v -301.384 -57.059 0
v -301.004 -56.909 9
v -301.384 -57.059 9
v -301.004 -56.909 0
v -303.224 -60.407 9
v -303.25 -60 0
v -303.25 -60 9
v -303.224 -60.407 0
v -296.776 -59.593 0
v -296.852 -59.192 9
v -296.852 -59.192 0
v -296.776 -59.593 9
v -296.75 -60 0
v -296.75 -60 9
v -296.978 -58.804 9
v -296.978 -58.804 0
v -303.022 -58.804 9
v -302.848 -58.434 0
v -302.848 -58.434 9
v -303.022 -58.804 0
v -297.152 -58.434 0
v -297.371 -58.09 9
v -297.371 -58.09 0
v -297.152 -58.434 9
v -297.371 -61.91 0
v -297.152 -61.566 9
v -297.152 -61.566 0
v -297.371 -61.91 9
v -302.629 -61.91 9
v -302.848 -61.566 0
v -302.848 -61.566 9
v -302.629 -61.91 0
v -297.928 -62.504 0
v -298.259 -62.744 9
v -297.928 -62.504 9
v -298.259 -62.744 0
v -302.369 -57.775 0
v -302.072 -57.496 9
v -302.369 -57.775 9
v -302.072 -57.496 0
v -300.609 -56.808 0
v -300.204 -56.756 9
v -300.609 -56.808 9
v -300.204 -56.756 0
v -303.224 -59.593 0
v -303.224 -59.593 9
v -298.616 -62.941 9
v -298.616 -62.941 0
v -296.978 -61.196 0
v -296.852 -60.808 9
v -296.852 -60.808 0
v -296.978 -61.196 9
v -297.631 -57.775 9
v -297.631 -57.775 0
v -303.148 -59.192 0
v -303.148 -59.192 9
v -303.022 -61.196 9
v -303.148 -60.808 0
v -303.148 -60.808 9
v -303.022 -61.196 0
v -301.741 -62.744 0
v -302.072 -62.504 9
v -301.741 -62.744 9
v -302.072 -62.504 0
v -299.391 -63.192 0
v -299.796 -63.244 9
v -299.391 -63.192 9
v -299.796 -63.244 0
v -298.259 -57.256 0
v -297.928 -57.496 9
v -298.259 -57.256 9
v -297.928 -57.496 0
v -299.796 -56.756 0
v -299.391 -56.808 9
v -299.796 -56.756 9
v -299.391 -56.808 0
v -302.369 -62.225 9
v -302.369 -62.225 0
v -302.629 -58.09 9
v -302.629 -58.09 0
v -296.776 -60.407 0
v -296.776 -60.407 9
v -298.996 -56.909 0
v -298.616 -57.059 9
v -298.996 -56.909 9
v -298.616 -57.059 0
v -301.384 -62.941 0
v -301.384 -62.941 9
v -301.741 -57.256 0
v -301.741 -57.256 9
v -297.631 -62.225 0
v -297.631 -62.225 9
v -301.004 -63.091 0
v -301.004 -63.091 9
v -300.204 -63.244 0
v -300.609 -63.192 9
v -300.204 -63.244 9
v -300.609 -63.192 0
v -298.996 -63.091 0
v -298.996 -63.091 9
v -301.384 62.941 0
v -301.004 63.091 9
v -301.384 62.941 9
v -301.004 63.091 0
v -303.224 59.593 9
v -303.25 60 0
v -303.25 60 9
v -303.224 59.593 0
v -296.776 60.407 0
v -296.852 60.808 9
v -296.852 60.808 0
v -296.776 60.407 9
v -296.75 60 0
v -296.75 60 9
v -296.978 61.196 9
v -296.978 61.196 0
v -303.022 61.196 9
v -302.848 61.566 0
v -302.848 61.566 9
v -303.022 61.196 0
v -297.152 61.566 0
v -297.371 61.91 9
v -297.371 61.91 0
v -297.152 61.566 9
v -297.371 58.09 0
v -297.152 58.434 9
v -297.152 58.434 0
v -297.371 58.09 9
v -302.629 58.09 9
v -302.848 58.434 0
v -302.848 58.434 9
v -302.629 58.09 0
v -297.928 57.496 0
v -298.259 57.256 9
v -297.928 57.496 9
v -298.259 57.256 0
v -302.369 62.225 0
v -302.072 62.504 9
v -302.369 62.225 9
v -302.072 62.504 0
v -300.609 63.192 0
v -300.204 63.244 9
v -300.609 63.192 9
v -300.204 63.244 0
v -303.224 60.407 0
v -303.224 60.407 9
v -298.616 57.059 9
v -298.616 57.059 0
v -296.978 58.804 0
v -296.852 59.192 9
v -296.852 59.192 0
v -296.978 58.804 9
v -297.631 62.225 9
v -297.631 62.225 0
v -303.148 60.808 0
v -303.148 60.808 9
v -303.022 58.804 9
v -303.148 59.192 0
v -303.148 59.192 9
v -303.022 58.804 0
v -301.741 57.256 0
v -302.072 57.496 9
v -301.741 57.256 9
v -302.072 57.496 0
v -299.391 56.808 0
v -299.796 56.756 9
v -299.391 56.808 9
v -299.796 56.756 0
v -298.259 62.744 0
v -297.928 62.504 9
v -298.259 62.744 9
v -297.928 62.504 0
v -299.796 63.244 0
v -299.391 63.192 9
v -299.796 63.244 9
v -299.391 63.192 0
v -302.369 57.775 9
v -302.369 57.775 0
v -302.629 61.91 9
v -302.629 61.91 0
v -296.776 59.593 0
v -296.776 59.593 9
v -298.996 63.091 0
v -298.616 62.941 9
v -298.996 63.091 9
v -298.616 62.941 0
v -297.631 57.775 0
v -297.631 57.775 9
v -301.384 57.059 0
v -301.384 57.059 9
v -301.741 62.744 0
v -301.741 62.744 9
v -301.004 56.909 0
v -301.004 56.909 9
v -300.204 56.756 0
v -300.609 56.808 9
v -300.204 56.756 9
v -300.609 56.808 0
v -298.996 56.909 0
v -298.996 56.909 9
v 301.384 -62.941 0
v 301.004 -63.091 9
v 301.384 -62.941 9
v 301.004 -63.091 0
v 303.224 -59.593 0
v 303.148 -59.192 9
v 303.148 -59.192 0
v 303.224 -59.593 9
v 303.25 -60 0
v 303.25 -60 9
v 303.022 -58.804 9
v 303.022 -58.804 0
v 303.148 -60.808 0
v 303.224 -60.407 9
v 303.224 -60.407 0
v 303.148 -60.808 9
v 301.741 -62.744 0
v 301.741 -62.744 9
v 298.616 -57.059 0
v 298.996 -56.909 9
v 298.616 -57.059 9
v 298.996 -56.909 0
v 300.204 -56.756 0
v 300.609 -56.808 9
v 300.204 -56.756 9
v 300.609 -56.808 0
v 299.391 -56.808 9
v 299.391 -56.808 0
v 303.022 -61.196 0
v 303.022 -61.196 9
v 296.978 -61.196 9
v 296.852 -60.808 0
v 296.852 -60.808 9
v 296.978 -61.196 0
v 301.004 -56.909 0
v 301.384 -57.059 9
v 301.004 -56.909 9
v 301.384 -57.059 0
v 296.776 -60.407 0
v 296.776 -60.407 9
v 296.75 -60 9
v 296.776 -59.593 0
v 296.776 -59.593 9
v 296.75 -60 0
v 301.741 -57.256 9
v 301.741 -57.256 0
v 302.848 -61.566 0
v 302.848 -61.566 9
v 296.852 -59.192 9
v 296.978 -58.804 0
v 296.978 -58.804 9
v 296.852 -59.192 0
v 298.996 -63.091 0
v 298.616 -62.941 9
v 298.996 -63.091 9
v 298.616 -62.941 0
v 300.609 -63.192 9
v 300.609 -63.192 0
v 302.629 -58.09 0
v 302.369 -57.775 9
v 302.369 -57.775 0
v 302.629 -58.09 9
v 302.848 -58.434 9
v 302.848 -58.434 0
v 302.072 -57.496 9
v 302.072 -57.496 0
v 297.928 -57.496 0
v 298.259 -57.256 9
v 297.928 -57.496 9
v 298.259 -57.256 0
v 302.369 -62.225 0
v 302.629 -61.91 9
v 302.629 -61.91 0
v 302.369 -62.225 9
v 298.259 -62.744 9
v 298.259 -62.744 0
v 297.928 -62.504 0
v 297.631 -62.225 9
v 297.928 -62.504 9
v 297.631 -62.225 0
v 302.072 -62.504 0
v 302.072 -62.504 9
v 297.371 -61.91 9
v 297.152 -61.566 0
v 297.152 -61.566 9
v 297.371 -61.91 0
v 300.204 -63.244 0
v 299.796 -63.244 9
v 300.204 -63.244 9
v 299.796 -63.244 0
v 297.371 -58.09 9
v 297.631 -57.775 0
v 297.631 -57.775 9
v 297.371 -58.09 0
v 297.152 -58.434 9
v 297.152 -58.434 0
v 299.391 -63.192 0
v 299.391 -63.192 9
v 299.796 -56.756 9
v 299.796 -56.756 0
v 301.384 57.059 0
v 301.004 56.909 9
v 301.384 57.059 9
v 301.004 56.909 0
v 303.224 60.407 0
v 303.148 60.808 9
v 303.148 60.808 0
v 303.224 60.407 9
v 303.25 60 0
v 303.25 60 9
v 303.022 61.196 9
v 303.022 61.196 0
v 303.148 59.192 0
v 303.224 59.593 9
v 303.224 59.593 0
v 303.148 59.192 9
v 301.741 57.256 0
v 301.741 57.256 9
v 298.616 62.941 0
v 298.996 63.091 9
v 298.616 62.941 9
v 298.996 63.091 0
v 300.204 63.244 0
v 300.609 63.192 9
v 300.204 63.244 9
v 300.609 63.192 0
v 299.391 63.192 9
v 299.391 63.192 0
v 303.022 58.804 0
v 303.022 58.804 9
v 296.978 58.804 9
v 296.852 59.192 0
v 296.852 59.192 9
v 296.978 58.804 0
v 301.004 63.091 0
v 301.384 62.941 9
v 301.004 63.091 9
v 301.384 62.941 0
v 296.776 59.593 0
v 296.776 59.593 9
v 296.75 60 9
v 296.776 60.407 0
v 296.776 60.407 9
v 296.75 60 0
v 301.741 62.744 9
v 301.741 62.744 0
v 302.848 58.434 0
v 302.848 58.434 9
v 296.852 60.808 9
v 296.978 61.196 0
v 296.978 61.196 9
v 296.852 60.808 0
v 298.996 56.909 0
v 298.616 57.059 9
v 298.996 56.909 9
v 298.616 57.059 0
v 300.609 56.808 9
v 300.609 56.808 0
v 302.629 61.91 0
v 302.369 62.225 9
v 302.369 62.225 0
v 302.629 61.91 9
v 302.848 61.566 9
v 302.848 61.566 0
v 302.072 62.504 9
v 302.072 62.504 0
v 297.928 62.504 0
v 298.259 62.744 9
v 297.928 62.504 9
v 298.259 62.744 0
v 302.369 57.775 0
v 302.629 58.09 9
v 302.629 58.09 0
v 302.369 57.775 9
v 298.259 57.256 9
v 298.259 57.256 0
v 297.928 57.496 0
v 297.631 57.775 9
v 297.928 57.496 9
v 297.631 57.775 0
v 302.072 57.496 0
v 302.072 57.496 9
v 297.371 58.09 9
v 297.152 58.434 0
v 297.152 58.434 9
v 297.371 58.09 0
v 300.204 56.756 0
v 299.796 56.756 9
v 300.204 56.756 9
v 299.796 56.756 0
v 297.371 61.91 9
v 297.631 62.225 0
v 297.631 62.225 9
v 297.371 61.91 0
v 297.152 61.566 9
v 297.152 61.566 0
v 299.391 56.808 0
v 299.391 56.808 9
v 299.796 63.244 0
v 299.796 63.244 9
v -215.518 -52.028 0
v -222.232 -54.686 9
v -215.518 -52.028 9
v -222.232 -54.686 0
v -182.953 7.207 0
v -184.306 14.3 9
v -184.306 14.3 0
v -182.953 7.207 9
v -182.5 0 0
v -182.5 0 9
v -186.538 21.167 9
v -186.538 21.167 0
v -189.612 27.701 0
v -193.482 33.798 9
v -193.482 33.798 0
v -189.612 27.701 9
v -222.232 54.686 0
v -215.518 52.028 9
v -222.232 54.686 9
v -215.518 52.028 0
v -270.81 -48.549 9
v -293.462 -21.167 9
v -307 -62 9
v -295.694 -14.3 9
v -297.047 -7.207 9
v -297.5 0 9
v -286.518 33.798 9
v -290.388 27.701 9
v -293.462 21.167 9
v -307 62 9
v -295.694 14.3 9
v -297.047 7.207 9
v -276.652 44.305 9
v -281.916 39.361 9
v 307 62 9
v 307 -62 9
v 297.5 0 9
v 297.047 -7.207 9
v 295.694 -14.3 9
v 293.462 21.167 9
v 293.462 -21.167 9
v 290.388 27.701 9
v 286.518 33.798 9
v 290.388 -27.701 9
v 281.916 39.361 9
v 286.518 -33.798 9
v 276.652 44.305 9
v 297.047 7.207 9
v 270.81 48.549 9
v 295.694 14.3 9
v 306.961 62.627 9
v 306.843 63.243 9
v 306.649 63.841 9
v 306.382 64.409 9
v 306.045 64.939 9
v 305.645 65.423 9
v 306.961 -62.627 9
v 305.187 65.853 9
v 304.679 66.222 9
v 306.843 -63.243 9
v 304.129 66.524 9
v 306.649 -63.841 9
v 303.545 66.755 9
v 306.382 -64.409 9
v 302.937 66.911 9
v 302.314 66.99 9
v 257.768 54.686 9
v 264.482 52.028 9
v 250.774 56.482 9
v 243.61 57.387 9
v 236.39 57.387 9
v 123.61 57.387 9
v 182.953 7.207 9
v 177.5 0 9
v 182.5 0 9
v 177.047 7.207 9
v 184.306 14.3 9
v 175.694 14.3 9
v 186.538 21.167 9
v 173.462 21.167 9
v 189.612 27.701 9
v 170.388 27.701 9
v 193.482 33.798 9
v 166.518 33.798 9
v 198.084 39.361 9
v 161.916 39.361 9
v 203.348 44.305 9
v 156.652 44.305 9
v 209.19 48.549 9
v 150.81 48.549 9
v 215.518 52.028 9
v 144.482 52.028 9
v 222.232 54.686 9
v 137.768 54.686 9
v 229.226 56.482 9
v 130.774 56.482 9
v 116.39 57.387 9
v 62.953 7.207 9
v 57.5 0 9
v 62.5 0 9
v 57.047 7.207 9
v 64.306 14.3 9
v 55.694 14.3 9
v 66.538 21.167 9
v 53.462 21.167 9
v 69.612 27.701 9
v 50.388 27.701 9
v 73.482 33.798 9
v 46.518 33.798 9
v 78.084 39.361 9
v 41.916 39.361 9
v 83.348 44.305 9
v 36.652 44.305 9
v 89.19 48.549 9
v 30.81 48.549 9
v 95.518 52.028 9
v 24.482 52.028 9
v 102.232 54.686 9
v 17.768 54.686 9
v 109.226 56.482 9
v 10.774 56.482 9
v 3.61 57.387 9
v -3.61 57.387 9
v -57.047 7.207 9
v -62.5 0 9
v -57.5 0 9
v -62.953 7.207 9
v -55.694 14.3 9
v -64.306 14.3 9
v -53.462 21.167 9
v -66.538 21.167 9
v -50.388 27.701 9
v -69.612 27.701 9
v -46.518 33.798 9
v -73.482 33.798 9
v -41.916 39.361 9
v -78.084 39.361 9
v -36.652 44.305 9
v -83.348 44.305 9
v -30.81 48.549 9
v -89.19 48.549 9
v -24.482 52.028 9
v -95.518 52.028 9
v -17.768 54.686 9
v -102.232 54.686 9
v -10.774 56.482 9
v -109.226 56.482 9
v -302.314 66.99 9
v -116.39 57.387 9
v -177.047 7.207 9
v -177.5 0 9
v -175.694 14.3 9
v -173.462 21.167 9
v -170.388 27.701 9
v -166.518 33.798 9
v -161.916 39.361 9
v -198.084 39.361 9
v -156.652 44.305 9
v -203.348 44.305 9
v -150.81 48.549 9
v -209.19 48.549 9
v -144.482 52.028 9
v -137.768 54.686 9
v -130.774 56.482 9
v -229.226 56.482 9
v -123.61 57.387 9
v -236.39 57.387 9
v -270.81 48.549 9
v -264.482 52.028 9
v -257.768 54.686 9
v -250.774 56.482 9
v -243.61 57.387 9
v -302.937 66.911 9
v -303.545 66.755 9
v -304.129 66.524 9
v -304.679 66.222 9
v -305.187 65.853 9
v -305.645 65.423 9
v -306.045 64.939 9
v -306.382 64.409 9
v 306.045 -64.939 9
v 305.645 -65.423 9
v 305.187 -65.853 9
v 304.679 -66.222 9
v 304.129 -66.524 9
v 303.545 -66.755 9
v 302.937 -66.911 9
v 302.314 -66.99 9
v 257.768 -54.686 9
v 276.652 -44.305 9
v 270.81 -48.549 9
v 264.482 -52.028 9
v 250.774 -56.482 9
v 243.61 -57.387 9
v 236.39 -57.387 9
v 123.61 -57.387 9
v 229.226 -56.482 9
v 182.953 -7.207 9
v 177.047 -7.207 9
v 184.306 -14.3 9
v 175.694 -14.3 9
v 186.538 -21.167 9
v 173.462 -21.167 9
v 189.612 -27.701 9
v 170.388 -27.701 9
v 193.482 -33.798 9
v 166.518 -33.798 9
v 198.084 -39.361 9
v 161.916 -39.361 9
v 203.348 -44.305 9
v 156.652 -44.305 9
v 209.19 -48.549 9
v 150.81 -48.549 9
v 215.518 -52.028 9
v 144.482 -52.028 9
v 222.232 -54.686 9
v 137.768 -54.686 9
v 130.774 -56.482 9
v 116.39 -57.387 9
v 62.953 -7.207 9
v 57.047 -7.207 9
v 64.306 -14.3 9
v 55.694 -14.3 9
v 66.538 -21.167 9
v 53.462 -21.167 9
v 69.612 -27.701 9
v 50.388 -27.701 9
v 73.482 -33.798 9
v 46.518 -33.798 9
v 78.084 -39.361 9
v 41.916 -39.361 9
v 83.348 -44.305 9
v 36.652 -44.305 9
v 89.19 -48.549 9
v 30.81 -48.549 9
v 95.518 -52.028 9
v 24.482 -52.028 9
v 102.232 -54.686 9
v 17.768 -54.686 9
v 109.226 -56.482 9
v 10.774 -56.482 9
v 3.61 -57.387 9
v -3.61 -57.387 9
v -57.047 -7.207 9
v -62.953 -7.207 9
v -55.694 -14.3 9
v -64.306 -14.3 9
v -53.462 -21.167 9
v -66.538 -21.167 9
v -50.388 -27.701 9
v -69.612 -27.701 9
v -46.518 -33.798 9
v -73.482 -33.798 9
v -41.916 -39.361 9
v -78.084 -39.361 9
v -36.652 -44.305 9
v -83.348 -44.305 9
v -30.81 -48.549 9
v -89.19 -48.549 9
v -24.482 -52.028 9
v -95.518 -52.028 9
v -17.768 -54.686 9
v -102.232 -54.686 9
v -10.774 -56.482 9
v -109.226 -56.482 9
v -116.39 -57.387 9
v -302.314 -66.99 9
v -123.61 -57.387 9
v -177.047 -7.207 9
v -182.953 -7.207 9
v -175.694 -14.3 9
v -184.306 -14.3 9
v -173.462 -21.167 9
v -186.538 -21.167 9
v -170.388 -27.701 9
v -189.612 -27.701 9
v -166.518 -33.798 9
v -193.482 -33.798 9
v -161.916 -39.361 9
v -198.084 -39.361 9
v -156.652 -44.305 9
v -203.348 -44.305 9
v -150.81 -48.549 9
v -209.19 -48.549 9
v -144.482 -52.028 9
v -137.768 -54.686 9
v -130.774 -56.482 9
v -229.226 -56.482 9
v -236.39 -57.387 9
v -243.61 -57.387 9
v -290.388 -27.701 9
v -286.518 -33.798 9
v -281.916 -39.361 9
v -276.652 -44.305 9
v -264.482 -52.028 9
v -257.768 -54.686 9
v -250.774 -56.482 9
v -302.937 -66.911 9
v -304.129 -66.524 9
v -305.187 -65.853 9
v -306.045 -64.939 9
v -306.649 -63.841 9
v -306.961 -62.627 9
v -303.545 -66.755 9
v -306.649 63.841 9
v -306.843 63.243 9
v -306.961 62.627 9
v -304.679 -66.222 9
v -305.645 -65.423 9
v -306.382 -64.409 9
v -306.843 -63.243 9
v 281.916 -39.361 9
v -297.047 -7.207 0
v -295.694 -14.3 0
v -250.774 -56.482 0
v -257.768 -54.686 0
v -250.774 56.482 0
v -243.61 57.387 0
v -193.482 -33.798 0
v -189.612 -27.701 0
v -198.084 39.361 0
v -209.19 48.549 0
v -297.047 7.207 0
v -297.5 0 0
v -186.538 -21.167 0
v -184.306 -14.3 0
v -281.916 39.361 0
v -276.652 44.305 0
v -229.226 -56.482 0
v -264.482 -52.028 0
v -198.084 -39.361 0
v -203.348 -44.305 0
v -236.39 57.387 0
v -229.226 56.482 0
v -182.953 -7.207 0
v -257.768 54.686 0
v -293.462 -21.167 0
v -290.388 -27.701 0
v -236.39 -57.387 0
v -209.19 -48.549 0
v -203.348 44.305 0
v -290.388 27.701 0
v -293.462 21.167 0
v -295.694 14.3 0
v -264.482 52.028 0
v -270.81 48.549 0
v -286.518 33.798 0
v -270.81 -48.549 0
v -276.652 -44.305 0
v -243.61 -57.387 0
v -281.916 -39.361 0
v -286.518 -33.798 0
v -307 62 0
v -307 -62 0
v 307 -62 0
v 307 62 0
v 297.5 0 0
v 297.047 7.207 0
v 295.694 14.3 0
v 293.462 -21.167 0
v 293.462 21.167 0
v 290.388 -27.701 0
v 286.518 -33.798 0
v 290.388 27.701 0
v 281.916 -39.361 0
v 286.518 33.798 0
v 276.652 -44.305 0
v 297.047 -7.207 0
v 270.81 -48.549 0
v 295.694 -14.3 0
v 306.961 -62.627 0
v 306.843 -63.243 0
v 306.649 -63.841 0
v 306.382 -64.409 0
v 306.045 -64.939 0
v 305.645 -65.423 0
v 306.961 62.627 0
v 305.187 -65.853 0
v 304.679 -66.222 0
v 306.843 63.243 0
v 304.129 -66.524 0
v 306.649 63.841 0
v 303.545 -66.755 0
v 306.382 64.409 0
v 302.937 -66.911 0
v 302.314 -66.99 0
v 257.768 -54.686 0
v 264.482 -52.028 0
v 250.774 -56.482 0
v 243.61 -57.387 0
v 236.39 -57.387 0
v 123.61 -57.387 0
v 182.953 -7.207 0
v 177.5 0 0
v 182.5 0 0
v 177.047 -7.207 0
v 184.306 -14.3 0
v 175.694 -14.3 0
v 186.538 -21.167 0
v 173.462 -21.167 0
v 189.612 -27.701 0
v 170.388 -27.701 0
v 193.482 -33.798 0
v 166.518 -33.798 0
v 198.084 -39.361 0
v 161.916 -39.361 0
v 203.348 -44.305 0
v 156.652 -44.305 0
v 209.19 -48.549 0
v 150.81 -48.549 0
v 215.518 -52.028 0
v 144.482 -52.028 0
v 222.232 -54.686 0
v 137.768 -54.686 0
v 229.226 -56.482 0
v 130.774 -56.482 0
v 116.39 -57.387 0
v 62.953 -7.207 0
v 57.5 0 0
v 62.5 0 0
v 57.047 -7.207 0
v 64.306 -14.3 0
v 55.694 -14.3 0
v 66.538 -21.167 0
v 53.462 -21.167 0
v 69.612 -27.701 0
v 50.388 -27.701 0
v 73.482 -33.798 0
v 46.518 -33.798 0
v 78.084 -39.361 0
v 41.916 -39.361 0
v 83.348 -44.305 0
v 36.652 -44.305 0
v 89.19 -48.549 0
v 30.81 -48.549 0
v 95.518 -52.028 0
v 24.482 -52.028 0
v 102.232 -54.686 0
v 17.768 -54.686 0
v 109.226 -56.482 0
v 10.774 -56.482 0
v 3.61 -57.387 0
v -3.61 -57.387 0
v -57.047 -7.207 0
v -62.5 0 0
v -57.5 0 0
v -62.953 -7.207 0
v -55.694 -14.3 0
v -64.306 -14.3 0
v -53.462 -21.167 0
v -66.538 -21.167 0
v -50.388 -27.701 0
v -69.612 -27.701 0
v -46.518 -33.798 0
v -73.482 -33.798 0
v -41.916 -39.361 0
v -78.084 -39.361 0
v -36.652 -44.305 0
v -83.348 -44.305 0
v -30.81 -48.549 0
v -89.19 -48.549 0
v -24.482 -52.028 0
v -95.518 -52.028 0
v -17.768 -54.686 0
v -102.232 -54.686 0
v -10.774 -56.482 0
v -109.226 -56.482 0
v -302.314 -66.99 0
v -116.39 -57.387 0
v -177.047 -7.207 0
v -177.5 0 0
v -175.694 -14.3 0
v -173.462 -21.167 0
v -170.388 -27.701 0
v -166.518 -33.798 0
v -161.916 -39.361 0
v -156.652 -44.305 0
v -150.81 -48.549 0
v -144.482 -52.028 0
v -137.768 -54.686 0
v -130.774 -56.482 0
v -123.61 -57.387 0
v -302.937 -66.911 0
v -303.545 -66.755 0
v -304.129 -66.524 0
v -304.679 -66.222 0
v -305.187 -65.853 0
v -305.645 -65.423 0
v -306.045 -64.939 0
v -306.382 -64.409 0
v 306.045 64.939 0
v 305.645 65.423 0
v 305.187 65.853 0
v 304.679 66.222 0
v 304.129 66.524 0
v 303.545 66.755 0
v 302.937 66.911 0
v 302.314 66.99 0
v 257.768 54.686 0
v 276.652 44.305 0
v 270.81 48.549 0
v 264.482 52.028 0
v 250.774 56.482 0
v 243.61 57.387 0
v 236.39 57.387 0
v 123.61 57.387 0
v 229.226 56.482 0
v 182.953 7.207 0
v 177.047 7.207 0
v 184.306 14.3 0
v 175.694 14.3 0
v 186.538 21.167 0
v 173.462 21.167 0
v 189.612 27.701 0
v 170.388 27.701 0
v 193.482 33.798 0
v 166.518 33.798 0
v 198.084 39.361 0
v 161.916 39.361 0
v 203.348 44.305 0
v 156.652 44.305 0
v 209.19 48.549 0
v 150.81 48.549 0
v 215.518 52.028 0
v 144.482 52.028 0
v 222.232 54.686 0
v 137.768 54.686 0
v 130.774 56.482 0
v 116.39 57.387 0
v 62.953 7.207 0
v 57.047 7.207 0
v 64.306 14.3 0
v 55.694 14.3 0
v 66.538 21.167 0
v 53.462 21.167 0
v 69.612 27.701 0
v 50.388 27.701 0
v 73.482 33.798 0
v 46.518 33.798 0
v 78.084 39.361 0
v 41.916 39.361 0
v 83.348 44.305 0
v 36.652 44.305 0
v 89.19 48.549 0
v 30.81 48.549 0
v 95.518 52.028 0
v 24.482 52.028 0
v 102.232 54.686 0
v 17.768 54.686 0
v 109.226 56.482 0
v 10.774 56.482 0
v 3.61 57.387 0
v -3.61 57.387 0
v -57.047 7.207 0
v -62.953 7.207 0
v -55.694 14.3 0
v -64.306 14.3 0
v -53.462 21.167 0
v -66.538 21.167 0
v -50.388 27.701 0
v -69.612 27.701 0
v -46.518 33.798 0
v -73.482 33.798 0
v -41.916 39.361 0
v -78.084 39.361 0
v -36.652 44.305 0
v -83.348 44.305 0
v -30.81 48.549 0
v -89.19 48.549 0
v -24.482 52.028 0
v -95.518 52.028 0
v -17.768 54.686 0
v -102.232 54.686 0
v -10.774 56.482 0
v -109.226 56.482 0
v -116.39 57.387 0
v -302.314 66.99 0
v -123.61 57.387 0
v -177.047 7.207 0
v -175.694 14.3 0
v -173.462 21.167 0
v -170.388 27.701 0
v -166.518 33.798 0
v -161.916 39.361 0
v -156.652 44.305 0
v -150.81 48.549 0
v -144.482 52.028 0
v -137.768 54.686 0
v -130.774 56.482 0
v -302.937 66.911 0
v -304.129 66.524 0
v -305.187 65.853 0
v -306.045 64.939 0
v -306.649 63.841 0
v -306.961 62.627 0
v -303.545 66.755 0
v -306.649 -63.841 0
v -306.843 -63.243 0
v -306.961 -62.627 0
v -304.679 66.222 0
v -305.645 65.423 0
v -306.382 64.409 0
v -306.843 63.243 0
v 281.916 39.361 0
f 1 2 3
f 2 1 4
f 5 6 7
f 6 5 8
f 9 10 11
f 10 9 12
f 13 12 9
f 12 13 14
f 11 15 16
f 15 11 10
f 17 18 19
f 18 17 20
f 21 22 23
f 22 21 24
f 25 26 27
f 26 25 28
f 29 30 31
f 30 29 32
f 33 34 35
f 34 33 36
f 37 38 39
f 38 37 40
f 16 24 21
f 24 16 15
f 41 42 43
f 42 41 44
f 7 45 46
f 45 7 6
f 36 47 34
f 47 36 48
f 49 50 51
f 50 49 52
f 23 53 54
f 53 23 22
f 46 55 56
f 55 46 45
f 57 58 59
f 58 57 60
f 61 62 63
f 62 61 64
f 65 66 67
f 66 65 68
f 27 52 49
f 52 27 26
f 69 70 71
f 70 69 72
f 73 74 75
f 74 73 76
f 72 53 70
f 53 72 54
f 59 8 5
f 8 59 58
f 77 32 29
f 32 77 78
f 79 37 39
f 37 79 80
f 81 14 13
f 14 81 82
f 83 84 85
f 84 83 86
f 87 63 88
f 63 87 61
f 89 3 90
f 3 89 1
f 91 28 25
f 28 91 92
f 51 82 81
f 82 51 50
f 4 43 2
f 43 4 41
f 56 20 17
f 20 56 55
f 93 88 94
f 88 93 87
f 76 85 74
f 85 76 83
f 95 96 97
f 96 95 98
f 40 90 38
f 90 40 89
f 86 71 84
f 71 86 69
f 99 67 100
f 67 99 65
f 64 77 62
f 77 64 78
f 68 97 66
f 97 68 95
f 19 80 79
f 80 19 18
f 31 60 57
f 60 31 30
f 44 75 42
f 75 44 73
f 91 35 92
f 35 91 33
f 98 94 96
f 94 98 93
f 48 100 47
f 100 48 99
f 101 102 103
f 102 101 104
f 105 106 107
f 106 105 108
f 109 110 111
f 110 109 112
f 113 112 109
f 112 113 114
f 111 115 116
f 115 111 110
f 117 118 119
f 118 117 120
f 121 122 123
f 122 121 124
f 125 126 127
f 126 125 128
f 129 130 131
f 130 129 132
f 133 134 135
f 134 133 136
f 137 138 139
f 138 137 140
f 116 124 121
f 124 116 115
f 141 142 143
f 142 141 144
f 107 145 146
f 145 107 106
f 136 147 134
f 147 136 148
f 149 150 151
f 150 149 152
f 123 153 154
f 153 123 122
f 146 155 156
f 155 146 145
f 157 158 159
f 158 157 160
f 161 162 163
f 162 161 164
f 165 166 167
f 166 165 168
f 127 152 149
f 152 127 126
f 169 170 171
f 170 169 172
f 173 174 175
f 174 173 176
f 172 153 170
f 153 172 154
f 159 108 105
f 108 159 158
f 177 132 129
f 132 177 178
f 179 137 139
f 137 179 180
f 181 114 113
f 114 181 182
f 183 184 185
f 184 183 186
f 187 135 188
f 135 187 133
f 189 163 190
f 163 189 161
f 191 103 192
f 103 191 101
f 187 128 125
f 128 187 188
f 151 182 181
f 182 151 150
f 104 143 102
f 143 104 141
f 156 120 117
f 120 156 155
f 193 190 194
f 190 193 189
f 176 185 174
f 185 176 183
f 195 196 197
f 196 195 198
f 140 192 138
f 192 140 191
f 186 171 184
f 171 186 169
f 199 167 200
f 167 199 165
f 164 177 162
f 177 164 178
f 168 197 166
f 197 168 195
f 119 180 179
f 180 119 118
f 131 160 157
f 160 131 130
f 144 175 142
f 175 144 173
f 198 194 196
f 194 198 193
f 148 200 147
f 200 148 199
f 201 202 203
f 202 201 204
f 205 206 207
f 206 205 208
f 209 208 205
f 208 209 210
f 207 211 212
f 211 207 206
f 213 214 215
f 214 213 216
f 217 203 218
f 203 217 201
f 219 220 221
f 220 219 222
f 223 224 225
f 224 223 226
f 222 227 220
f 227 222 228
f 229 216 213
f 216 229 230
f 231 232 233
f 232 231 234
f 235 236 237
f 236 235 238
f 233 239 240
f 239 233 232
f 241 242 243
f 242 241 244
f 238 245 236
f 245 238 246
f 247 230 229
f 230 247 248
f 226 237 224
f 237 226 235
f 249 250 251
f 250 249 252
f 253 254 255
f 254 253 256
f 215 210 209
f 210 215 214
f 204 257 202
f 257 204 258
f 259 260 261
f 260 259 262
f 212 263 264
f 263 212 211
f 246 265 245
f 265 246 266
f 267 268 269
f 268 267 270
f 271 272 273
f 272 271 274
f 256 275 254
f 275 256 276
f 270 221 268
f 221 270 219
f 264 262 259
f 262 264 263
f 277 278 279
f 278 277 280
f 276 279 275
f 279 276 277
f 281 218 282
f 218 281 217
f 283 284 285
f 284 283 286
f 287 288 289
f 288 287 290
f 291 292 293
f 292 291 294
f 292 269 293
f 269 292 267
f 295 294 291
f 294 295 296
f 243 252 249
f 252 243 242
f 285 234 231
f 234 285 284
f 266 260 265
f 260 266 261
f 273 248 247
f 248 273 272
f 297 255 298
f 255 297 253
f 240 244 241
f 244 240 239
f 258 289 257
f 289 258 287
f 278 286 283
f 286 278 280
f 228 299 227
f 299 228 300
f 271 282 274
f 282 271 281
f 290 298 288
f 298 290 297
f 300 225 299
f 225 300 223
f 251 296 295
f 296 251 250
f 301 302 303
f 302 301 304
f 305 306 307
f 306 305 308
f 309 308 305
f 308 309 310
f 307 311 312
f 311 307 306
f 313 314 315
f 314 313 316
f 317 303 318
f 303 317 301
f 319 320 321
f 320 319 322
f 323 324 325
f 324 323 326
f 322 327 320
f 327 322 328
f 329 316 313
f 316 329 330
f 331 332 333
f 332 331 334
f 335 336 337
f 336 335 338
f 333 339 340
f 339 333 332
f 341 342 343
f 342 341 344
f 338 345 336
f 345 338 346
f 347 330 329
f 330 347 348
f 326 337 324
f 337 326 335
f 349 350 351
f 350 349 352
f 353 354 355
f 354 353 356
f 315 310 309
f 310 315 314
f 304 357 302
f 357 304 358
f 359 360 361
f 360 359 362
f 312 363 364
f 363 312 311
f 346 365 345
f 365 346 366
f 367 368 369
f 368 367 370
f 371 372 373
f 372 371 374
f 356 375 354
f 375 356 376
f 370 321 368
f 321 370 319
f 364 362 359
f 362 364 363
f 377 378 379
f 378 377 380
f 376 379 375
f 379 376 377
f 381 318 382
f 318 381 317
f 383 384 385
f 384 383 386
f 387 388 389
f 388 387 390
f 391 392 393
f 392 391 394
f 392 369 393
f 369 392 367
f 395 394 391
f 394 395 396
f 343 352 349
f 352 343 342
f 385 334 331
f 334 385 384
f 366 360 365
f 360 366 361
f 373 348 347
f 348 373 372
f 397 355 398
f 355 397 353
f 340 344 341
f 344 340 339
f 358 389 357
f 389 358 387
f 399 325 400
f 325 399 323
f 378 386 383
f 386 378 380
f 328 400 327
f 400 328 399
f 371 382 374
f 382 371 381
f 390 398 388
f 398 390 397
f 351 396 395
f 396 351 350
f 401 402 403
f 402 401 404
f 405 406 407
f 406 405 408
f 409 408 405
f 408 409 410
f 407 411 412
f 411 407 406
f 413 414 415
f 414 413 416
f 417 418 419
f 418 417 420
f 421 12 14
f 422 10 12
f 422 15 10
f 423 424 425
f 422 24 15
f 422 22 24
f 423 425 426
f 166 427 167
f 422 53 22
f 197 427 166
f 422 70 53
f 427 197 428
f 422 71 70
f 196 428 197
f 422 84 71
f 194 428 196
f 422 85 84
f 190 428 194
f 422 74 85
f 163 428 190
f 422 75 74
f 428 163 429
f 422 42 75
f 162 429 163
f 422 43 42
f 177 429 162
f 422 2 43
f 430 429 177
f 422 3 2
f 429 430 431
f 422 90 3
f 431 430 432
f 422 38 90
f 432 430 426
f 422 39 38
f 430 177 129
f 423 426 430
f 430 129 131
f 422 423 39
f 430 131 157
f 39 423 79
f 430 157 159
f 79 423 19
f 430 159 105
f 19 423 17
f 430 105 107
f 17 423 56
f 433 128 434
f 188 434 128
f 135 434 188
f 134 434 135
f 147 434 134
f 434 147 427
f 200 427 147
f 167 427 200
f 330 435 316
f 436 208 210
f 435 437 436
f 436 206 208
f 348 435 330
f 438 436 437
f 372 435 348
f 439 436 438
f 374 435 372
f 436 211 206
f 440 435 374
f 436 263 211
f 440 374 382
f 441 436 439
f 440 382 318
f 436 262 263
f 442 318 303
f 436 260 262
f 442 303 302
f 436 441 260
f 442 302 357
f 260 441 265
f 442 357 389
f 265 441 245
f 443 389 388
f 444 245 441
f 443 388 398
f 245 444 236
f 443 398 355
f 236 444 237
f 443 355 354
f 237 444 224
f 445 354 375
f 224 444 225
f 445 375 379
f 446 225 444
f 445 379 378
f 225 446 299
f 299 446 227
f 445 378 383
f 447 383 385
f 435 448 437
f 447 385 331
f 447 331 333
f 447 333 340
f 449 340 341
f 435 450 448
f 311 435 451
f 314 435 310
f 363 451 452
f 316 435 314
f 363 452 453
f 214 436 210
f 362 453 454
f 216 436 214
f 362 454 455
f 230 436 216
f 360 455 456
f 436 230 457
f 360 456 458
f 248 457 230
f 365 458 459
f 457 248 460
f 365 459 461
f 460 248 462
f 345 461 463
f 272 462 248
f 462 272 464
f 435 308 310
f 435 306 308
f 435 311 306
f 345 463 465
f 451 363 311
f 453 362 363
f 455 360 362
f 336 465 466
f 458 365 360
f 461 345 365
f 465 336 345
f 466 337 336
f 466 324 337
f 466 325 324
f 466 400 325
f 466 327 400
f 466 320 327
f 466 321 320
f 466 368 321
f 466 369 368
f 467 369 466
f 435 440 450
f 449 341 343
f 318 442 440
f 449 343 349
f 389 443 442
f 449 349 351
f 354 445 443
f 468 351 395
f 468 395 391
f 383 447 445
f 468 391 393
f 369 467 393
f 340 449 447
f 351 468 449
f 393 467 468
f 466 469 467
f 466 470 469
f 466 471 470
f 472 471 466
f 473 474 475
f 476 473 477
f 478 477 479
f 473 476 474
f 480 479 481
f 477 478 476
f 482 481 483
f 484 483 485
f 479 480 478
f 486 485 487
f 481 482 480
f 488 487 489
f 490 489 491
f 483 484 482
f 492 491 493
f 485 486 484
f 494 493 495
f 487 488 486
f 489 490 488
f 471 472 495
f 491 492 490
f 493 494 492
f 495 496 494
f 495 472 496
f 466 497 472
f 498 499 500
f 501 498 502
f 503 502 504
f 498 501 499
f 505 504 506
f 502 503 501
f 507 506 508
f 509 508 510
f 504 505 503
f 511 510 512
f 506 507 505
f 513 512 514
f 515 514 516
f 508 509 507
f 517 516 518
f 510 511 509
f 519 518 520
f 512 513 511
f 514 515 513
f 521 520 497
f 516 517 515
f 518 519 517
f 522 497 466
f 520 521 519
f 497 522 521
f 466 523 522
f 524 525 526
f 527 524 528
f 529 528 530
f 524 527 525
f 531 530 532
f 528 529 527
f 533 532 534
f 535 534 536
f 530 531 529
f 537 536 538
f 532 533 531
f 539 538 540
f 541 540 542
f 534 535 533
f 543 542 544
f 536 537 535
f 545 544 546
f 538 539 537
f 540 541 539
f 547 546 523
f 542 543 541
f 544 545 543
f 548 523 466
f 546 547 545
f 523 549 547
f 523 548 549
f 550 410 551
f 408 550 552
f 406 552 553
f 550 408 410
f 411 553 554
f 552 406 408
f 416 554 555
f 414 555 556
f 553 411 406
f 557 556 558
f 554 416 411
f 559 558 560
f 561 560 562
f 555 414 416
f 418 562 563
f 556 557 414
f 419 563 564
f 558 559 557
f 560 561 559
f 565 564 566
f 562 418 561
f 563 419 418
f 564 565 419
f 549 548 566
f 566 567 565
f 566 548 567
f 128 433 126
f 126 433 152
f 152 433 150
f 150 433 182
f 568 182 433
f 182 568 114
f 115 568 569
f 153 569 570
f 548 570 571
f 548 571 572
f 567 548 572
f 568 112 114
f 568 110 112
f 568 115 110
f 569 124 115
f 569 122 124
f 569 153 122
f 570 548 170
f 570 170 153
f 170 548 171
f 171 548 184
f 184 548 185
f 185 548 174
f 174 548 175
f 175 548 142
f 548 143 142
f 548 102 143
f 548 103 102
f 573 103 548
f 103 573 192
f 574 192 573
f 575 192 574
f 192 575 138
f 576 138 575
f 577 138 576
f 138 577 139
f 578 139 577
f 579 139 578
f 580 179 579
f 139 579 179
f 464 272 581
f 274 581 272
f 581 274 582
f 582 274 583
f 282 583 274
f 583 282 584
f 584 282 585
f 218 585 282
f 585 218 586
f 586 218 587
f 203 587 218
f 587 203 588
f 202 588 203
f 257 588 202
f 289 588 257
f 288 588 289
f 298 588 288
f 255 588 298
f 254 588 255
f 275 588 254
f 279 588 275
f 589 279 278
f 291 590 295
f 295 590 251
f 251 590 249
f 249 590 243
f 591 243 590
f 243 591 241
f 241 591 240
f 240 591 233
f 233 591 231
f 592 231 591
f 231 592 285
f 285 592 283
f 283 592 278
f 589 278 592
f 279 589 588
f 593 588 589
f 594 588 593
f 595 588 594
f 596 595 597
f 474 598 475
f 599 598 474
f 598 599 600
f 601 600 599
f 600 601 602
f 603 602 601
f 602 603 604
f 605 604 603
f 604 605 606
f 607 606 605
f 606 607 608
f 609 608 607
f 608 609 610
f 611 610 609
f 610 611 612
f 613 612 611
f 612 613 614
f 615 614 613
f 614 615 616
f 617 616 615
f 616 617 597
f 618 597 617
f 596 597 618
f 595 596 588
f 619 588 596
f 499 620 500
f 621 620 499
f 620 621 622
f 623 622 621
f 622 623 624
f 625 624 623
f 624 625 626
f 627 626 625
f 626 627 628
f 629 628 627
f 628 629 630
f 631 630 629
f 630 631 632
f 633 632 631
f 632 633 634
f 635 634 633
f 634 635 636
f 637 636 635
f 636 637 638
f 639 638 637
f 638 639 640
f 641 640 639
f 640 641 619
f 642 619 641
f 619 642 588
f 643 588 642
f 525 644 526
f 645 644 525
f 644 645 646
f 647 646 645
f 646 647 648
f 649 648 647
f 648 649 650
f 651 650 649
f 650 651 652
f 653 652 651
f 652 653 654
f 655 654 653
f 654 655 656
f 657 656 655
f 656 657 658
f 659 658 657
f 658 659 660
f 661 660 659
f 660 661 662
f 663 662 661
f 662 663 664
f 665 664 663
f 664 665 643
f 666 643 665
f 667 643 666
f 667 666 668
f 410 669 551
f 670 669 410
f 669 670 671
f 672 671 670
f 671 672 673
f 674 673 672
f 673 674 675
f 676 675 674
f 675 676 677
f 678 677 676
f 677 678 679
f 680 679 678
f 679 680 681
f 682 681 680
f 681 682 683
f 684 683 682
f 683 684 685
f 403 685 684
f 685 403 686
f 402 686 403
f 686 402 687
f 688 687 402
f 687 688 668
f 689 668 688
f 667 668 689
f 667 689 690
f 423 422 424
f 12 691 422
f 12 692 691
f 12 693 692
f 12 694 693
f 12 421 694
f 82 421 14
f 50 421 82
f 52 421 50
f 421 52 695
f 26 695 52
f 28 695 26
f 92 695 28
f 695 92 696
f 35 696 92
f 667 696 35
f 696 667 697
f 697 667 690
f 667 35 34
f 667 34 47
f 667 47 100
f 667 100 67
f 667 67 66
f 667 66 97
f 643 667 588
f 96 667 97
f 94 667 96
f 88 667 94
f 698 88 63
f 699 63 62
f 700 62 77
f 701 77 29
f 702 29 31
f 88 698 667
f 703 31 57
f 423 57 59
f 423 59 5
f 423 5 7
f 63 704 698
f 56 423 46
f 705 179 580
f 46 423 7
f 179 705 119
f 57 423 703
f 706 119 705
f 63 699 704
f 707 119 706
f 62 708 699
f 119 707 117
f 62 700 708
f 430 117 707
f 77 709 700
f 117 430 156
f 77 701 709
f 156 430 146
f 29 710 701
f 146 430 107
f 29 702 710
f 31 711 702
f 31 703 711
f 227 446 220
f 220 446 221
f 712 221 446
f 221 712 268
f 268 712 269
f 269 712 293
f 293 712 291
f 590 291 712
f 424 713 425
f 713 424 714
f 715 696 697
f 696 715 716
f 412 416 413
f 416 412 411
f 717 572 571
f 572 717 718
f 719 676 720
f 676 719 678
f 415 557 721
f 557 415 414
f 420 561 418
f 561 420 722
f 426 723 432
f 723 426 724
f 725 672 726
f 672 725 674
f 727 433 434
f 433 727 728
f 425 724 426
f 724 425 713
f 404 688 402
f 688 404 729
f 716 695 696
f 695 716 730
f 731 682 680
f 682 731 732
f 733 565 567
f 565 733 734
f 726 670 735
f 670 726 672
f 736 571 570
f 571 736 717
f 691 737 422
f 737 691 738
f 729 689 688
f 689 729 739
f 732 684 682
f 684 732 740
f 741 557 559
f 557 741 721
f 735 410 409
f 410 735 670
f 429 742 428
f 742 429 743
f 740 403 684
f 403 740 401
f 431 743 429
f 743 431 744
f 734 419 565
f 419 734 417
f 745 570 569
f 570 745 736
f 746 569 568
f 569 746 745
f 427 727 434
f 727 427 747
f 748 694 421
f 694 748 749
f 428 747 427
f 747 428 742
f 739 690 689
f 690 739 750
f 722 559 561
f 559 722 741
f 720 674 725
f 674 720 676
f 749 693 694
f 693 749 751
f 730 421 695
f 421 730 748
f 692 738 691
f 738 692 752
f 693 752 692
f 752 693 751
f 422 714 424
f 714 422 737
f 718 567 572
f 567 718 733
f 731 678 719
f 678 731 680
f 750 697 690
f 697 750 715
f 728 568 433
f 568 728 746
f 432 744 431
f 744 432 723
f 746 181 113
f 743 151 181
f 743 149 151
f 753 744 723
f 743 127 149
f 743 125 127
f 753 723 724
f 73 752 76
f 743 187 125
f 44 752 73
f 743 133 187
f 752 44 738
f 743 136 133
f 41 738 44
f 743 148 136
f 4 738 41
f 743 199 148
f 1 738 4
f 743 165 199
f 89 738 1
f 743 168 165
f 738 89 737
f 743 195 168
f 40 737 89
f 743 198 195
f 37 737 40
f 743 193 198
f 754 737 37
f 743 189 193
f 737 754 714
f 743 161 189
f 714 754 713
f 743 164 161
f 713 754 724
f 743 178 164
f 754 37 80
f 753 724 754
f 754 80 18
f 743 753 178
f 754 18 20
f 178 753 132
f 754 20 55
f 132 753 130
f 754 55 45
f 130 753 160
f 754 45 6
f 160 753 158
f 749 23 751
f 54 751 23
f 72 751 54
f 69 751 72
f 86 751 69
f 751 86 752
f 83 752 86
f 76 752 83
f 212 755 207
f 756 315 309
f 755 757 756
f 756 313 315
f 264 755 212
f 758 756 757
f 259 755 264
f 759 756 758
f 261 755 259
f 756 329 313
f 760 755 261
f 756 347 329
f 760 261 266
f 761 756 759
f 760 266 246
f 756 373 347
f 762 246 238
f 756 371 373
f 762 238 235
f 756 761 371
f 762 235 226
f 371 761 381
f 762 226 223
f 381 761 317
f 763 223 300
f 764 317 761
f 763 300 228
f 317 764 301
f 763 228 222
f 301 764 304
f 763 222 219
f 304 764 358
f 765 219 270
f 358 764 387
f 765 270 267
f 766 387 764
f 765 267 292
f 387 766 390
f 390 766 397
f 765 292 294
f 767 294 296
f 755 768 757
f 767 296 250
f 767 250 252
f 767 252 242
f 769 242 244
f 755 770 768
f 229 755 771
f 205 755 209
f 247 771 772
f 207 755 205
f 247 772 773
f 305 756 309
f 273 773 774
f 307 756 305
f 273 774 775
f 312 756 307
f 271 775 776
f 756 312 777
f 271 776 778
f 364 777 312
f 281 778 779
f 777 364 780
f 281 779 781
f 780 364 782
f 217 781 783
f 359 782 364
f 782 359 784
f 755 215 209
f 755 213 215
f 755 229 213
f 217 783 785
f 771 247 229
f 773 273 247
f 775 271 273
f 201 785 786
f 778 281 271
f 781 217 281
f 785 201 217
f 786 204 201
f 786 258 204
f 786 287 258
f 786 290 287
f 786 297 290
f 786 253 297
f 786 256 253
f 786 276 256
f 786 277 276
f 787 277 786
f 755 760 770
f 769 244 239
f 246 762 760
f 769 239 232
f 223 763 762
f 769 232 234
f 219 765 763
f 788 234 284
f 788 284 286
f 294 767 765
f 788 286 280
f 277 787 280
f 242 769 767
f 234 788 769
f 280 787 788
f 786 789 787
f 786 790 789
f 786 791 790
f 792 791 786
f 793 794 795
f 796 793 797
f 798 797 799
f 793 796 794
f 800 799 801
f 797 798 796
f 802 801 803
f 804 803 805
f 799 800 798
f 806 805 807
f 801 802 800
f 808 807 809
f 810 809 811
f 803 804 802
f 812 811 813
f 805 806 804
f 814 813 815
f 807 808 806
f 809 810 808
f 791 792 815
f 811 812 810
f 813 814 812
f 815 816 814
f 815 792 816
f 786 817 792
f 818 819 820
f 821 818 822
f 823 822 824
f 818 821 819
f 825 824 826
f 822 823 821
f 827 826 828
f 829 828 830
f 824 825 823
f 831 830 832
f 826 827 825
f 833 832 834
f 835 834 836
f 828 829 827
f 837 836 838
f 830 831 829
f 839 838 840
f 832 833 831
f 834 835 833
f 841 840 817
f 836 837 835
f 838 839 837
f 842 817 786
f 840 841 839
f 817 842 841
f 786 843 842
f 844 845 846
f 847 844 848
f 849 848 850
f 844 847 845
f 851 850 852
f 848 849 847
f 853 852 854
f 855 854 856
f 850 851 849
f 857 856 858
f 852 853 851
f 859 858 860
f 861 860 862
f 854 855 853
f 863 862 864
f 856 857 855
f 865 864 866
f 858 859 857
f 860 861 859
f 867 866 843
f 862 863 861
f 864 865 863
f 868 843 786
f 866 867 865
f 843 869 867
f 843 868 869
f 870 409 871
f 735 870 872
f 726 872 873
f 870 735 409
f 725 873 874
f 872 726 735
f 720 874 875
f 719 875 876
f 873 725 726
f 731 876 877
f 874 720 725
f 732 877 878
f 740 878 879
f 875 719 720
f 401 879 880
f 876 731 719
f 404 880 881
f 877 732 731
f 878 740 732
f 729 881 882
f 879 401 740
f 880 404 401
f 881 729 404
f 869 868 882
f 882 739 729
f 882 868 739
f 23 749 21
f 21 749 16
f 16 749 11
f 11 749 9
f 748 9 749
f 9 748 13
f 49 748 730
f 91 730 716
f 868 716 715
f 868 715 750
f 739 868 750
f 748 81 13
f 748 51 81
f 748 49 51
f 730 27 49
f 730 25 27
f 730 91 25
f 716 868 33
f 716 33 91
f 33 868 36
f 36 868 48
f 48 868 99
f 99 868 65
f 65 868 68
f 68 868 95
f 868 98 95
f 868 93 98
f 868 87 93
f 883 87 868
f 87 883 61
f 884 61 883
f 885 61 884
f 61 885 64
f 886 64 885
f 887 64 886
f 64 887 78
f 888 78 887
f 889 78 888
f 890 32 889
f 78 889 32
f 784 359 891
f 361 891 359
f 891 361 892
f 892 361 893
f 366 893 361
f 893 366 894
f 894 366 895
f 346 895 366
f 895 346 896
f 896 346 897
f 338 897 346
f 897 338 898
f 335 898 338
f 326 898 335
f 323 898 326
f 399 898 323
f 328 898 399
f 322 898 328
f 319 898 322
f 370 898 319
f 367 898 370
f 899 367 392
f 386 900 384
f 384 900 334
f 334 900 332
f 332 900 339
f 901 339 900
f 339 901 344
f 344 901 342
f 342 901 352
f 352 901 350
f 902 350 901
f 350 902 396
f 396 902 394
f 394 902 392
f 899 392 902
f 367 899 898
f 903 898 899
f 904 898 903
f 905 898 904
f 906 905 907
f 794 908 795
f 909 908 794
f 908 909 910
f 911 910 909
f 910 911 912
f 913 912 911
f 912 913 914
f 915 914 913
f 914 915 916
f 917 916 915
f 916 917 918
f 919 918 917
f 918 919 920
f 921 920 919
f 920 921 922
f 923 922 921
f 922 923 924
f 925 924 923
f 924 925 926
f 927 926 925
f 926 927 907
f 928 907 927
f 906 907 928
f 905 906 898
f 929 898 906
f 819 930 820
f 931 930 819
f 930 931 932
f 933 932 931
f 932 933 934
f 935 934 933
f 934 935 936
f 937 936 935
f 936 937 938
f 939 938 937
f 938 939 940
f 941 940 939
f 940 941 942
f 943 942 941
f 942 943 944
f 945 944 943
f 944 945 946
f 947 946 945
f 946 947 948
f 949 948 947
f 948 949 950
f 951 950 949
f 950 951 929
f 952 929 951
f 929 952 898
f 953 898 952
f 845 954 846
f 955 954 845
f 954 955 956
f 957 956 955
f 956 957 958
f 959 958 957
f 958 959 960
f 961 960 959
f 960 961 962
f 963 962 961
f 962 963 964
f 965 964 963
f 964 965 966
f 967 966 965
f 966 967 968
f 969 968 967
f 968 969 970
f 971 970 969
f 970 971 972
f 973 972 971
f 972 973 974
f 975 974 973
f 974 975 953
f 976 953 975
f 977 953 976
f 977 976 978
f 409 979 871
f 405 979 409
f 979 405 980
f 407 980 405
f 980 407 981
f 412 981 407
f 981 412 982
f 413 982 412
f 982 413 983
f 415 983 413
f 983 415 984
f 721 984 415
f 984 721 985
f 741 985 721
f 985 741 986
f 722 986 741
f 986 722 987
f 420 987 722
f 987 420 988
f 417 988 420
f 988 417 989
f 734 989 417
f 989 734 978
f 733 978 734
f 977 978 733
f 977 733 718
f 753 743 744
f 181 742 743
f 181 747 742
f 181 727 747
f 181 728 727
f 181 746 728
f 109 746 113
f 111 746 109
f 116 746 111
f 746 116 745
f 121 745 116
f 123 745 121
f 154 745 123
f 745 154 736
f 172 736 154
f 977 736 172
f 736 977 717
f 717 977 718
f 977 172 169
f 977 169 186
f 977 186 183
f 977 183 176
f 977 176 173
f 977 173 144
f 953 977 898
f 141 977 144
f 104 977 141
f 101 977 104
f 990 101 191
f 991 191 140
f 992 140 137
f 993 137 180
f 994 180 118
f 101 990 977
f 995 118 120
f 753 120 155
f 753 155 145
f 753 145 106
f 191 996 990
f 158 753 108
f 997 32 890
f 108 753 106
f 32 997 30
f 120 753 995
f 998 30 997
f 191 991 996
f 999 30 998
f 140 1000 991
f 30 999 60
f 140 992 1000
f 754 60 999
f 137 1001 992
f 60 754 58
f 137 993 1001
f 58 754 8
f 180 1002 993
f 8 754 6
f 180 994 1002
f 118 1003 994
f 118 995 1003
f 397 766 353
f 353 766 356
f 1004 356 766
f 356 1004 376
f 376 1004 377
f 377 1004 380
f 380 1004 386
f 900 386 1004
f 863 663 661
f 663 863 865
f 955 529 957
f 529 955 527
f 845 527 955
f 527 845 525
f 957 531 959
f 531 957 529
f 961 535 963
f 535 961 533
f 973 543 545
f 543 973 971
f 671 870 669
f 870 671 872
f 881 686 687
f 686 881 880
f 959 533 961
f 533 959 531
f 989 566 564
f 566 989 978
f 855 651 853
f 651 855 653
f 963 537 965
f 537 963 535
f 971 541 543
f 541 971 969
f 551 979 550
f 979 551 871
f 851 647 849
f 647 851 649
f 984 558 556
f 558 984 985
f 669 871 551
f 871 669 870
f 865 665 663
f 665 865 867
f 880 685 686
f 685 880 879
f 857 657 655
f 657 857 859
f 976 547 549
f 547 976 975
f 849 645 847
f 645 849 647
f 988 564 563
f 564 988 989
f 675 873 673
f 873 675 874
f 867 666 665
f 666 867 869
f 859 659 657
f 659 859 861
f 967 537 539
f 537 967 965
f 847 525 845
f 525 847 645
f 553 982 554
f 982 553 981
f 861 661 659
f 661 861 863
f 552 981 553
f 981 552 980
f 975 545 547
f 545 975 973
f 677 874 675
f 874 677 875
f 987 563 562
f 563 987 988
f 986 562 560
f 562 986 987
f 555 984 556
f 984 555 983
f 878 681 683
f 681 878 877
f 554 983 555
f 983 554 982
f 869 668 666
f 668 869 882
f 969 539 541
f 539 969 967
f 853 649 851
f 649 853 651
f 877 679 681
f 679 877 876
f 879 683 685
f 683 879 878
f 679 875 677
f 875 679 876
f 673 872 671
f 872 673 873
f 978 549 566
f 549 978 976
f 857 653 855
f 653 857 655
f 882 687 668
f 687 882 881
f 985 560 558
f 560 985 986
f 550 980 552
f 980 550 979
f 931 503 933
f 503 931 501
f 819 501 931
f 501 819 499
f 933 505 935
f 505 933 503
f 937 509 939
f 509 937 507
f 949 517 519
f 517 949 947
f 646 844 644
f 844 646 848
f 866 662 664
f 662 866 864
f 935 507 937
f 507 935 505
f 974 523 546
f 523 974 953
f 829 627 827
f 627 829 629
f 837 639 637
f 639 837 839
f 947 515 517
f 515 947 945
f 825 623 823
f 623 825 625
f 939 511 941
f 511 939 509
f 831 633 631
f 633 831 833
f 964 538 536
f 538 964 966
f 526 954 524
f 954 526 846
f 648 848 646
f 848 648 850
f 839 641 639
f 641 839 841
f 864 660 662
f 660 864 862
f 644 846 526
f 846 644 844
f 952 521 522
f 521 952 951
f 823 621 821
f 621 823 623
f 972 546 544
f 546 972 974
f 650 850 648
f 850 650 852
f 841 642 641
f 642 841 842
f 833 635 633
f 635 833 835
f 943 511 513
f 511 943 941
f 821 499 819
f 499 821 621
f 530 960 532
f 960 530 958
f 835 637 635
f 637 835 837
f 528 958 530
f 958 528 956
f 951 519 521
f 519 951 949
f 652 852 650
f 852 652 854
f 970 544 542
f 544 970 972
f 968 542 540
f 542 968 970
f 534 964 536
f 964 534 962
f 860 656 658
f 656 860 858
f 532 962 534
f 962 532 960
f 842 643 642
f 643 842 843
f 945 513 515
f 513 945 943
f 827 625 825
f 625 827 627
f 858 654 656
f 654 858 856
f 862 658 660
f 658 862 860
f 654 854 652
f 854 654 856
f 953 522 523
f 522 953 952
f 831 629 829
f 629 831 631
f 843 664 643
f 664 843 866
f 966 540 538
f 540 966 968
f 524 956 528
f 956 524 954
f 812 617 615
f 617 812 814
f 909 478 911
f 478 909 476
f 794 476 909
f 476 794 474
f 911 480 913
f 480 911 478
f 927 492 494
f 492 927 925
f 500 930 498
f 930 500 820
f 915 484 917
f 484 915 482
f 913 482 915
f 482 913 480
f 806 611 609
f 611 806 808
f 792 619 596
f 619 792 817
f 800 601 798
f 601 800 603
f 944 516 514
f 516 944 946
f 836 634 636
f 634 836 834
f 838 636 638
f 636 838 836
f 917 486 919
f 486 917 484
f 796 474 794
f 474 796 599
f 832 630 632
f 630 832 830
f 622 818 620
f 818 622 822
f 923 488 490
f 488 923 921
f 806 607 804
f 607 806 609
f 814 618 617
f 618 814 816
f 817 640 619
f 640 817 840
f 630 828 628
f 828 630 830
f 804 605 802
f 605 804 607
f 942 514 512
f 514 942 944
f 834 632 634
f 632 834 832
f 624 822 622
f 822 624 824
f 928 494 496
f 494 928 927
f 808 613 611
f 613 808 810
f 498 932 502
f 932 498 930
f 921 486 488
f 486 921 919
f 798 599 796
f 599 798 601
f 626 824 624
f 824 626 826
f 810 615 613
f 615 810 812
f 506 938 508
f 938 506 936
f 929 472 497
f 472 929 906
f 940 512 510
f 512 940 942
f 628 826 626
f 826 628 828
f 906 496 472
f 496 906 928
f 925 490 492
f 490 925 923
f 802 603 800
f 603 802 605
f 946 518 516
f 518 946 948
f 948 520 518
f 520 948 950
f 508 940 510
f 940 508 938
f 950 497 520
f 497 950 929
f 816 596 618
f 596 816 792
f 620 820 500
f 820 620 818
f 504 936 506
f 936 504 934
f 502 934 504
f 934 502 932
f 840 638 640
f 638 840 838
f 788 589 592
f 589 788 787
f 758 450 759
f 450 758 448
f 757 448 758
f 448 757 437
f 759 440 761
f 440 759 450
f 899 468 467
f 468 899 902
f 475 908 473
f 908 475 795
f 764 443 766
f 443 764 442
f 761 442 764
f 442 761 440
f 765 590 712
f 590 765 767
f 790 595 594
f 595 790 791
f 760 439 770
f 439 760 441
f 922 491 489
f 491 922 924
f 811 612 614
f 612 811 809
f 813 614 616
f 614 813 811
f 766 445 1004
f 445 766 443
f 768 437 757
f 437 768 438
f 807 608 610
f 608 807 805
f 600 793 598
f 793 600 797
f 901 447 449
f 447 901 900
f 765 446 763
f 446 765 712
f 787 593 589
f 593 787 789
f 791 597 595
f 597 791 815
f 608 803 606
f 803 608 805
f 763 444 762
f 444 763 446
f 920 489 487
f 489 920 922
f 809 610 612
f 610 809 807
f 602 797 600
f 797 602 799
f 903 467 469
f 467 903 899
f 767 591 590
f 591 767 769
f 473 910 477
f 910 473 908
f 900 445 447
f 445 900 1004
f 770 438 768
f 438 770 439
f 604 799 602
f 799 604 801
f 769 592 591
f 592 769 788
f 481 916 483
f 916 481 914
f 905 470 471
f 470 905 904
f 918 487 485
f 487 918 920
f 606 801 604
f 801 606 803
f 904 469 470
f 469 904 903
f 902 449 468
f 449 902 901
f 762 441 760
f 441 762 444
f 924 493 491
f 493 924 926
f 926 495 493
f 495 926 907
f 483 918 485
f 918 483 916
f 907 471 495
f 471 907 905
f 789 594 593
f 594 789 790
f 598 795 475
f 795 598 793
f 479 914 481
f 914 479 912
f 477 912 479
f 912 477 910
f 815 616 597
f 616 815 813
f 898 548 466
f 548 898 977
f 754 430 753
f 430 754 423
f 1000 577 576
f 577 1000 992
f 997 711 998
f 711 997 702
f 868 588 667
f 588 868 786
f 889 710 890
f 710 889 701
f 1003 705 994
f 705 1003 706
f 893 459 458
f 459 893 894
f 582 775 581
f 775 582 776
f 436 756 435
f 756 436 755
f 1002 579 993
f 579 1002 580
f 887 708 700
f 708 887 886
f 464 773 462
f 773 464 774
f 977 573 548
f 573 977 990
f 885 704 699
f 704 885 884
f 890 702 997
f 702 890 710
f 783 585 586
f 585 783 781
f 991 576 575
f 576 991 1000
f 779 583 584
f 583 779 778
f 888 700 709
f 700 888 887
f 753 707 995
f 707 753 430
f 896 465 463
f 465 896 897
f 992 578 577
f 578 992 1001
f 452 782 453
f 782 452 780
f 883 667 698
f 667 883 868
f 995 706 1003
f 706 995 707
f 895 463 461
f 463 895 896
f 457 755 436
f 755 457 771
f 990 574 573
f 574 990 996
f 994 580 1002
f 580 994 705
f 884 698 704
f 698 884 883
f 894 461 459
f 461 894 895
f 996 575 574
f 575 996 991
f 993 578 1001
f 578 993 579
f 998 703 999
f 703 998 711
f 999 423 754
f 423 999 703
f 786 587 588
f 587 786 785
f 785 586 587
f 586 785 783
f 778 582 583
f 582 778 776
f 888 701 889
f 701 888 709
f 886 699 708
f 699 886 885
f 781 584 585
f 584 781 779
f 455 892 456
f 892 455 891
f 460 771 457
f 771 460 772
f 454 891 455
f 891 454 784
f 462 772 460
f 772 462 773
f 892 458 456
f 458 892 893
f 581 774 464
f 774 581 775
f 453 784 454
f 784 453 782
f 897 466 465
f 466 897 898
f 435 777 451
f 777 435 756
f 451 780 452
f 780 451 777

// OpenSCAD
$fn = 50;


difference() {
	union() {
		hull() {
			translate(v = [-302.0000000000, 62.0000000000, 0]) {
				cylinder(h = 9, r = 5);
			}
			translate(v = [302.0000000000, 62.0000000000, 0]) {
				cylinder(h = 9, r = 5);
			}
			translate(v = [-302.0000000000, -62.0000000000, 0]) {
				cylinder(h = 9, r = 5);
			}
			translate(v = [302.0000000000, -62.0000000000, 0]) {
				cylinder(h = 9, r = 5);
			}
		}
	}
	union() {
		#translate(v = [-300.0000000000, -60.0000000000, -100.0000000000]) {
			cylinder(h = 200, r = 3.2500000000);
		}
		#translate(v = [-300.0000000000, 60.0000000000, -100.0000000000]) {
			cylinder(h = 200, r = 3.2500000000);
		}
		#translate(v = [300.0000000000, -60.0000000000, -100.0000000000]) {
			cylinder(h = 200, r = 3.2500000000);
		}
		#translate(v = [300.0000000000, 60.0000000000, -100.0000000000]) {
			cylinder(h = 200, r = 3.2500000000);
		}
		#translate(v = [-240.0000000000, 0, 0]) {
			cylinder(h = 9, r = 57.5000000000);
		}
		#translate(v = [-120.0000000000, 0, 0]) {
			cylinder(h = 9, r = 57.5000000000);
		}
		#cylinder(h = 9, r = 57.5000000000);
		#translate(v = [120.0000000000, 0, 0]) {
			cylinder(h = 9, r = 57.5000000000);
		}
		#translate(v = [240.0000000000, 0, 0]) {
			cylinder(h = 9, r = 57.5000000000);
		}
	}
}
